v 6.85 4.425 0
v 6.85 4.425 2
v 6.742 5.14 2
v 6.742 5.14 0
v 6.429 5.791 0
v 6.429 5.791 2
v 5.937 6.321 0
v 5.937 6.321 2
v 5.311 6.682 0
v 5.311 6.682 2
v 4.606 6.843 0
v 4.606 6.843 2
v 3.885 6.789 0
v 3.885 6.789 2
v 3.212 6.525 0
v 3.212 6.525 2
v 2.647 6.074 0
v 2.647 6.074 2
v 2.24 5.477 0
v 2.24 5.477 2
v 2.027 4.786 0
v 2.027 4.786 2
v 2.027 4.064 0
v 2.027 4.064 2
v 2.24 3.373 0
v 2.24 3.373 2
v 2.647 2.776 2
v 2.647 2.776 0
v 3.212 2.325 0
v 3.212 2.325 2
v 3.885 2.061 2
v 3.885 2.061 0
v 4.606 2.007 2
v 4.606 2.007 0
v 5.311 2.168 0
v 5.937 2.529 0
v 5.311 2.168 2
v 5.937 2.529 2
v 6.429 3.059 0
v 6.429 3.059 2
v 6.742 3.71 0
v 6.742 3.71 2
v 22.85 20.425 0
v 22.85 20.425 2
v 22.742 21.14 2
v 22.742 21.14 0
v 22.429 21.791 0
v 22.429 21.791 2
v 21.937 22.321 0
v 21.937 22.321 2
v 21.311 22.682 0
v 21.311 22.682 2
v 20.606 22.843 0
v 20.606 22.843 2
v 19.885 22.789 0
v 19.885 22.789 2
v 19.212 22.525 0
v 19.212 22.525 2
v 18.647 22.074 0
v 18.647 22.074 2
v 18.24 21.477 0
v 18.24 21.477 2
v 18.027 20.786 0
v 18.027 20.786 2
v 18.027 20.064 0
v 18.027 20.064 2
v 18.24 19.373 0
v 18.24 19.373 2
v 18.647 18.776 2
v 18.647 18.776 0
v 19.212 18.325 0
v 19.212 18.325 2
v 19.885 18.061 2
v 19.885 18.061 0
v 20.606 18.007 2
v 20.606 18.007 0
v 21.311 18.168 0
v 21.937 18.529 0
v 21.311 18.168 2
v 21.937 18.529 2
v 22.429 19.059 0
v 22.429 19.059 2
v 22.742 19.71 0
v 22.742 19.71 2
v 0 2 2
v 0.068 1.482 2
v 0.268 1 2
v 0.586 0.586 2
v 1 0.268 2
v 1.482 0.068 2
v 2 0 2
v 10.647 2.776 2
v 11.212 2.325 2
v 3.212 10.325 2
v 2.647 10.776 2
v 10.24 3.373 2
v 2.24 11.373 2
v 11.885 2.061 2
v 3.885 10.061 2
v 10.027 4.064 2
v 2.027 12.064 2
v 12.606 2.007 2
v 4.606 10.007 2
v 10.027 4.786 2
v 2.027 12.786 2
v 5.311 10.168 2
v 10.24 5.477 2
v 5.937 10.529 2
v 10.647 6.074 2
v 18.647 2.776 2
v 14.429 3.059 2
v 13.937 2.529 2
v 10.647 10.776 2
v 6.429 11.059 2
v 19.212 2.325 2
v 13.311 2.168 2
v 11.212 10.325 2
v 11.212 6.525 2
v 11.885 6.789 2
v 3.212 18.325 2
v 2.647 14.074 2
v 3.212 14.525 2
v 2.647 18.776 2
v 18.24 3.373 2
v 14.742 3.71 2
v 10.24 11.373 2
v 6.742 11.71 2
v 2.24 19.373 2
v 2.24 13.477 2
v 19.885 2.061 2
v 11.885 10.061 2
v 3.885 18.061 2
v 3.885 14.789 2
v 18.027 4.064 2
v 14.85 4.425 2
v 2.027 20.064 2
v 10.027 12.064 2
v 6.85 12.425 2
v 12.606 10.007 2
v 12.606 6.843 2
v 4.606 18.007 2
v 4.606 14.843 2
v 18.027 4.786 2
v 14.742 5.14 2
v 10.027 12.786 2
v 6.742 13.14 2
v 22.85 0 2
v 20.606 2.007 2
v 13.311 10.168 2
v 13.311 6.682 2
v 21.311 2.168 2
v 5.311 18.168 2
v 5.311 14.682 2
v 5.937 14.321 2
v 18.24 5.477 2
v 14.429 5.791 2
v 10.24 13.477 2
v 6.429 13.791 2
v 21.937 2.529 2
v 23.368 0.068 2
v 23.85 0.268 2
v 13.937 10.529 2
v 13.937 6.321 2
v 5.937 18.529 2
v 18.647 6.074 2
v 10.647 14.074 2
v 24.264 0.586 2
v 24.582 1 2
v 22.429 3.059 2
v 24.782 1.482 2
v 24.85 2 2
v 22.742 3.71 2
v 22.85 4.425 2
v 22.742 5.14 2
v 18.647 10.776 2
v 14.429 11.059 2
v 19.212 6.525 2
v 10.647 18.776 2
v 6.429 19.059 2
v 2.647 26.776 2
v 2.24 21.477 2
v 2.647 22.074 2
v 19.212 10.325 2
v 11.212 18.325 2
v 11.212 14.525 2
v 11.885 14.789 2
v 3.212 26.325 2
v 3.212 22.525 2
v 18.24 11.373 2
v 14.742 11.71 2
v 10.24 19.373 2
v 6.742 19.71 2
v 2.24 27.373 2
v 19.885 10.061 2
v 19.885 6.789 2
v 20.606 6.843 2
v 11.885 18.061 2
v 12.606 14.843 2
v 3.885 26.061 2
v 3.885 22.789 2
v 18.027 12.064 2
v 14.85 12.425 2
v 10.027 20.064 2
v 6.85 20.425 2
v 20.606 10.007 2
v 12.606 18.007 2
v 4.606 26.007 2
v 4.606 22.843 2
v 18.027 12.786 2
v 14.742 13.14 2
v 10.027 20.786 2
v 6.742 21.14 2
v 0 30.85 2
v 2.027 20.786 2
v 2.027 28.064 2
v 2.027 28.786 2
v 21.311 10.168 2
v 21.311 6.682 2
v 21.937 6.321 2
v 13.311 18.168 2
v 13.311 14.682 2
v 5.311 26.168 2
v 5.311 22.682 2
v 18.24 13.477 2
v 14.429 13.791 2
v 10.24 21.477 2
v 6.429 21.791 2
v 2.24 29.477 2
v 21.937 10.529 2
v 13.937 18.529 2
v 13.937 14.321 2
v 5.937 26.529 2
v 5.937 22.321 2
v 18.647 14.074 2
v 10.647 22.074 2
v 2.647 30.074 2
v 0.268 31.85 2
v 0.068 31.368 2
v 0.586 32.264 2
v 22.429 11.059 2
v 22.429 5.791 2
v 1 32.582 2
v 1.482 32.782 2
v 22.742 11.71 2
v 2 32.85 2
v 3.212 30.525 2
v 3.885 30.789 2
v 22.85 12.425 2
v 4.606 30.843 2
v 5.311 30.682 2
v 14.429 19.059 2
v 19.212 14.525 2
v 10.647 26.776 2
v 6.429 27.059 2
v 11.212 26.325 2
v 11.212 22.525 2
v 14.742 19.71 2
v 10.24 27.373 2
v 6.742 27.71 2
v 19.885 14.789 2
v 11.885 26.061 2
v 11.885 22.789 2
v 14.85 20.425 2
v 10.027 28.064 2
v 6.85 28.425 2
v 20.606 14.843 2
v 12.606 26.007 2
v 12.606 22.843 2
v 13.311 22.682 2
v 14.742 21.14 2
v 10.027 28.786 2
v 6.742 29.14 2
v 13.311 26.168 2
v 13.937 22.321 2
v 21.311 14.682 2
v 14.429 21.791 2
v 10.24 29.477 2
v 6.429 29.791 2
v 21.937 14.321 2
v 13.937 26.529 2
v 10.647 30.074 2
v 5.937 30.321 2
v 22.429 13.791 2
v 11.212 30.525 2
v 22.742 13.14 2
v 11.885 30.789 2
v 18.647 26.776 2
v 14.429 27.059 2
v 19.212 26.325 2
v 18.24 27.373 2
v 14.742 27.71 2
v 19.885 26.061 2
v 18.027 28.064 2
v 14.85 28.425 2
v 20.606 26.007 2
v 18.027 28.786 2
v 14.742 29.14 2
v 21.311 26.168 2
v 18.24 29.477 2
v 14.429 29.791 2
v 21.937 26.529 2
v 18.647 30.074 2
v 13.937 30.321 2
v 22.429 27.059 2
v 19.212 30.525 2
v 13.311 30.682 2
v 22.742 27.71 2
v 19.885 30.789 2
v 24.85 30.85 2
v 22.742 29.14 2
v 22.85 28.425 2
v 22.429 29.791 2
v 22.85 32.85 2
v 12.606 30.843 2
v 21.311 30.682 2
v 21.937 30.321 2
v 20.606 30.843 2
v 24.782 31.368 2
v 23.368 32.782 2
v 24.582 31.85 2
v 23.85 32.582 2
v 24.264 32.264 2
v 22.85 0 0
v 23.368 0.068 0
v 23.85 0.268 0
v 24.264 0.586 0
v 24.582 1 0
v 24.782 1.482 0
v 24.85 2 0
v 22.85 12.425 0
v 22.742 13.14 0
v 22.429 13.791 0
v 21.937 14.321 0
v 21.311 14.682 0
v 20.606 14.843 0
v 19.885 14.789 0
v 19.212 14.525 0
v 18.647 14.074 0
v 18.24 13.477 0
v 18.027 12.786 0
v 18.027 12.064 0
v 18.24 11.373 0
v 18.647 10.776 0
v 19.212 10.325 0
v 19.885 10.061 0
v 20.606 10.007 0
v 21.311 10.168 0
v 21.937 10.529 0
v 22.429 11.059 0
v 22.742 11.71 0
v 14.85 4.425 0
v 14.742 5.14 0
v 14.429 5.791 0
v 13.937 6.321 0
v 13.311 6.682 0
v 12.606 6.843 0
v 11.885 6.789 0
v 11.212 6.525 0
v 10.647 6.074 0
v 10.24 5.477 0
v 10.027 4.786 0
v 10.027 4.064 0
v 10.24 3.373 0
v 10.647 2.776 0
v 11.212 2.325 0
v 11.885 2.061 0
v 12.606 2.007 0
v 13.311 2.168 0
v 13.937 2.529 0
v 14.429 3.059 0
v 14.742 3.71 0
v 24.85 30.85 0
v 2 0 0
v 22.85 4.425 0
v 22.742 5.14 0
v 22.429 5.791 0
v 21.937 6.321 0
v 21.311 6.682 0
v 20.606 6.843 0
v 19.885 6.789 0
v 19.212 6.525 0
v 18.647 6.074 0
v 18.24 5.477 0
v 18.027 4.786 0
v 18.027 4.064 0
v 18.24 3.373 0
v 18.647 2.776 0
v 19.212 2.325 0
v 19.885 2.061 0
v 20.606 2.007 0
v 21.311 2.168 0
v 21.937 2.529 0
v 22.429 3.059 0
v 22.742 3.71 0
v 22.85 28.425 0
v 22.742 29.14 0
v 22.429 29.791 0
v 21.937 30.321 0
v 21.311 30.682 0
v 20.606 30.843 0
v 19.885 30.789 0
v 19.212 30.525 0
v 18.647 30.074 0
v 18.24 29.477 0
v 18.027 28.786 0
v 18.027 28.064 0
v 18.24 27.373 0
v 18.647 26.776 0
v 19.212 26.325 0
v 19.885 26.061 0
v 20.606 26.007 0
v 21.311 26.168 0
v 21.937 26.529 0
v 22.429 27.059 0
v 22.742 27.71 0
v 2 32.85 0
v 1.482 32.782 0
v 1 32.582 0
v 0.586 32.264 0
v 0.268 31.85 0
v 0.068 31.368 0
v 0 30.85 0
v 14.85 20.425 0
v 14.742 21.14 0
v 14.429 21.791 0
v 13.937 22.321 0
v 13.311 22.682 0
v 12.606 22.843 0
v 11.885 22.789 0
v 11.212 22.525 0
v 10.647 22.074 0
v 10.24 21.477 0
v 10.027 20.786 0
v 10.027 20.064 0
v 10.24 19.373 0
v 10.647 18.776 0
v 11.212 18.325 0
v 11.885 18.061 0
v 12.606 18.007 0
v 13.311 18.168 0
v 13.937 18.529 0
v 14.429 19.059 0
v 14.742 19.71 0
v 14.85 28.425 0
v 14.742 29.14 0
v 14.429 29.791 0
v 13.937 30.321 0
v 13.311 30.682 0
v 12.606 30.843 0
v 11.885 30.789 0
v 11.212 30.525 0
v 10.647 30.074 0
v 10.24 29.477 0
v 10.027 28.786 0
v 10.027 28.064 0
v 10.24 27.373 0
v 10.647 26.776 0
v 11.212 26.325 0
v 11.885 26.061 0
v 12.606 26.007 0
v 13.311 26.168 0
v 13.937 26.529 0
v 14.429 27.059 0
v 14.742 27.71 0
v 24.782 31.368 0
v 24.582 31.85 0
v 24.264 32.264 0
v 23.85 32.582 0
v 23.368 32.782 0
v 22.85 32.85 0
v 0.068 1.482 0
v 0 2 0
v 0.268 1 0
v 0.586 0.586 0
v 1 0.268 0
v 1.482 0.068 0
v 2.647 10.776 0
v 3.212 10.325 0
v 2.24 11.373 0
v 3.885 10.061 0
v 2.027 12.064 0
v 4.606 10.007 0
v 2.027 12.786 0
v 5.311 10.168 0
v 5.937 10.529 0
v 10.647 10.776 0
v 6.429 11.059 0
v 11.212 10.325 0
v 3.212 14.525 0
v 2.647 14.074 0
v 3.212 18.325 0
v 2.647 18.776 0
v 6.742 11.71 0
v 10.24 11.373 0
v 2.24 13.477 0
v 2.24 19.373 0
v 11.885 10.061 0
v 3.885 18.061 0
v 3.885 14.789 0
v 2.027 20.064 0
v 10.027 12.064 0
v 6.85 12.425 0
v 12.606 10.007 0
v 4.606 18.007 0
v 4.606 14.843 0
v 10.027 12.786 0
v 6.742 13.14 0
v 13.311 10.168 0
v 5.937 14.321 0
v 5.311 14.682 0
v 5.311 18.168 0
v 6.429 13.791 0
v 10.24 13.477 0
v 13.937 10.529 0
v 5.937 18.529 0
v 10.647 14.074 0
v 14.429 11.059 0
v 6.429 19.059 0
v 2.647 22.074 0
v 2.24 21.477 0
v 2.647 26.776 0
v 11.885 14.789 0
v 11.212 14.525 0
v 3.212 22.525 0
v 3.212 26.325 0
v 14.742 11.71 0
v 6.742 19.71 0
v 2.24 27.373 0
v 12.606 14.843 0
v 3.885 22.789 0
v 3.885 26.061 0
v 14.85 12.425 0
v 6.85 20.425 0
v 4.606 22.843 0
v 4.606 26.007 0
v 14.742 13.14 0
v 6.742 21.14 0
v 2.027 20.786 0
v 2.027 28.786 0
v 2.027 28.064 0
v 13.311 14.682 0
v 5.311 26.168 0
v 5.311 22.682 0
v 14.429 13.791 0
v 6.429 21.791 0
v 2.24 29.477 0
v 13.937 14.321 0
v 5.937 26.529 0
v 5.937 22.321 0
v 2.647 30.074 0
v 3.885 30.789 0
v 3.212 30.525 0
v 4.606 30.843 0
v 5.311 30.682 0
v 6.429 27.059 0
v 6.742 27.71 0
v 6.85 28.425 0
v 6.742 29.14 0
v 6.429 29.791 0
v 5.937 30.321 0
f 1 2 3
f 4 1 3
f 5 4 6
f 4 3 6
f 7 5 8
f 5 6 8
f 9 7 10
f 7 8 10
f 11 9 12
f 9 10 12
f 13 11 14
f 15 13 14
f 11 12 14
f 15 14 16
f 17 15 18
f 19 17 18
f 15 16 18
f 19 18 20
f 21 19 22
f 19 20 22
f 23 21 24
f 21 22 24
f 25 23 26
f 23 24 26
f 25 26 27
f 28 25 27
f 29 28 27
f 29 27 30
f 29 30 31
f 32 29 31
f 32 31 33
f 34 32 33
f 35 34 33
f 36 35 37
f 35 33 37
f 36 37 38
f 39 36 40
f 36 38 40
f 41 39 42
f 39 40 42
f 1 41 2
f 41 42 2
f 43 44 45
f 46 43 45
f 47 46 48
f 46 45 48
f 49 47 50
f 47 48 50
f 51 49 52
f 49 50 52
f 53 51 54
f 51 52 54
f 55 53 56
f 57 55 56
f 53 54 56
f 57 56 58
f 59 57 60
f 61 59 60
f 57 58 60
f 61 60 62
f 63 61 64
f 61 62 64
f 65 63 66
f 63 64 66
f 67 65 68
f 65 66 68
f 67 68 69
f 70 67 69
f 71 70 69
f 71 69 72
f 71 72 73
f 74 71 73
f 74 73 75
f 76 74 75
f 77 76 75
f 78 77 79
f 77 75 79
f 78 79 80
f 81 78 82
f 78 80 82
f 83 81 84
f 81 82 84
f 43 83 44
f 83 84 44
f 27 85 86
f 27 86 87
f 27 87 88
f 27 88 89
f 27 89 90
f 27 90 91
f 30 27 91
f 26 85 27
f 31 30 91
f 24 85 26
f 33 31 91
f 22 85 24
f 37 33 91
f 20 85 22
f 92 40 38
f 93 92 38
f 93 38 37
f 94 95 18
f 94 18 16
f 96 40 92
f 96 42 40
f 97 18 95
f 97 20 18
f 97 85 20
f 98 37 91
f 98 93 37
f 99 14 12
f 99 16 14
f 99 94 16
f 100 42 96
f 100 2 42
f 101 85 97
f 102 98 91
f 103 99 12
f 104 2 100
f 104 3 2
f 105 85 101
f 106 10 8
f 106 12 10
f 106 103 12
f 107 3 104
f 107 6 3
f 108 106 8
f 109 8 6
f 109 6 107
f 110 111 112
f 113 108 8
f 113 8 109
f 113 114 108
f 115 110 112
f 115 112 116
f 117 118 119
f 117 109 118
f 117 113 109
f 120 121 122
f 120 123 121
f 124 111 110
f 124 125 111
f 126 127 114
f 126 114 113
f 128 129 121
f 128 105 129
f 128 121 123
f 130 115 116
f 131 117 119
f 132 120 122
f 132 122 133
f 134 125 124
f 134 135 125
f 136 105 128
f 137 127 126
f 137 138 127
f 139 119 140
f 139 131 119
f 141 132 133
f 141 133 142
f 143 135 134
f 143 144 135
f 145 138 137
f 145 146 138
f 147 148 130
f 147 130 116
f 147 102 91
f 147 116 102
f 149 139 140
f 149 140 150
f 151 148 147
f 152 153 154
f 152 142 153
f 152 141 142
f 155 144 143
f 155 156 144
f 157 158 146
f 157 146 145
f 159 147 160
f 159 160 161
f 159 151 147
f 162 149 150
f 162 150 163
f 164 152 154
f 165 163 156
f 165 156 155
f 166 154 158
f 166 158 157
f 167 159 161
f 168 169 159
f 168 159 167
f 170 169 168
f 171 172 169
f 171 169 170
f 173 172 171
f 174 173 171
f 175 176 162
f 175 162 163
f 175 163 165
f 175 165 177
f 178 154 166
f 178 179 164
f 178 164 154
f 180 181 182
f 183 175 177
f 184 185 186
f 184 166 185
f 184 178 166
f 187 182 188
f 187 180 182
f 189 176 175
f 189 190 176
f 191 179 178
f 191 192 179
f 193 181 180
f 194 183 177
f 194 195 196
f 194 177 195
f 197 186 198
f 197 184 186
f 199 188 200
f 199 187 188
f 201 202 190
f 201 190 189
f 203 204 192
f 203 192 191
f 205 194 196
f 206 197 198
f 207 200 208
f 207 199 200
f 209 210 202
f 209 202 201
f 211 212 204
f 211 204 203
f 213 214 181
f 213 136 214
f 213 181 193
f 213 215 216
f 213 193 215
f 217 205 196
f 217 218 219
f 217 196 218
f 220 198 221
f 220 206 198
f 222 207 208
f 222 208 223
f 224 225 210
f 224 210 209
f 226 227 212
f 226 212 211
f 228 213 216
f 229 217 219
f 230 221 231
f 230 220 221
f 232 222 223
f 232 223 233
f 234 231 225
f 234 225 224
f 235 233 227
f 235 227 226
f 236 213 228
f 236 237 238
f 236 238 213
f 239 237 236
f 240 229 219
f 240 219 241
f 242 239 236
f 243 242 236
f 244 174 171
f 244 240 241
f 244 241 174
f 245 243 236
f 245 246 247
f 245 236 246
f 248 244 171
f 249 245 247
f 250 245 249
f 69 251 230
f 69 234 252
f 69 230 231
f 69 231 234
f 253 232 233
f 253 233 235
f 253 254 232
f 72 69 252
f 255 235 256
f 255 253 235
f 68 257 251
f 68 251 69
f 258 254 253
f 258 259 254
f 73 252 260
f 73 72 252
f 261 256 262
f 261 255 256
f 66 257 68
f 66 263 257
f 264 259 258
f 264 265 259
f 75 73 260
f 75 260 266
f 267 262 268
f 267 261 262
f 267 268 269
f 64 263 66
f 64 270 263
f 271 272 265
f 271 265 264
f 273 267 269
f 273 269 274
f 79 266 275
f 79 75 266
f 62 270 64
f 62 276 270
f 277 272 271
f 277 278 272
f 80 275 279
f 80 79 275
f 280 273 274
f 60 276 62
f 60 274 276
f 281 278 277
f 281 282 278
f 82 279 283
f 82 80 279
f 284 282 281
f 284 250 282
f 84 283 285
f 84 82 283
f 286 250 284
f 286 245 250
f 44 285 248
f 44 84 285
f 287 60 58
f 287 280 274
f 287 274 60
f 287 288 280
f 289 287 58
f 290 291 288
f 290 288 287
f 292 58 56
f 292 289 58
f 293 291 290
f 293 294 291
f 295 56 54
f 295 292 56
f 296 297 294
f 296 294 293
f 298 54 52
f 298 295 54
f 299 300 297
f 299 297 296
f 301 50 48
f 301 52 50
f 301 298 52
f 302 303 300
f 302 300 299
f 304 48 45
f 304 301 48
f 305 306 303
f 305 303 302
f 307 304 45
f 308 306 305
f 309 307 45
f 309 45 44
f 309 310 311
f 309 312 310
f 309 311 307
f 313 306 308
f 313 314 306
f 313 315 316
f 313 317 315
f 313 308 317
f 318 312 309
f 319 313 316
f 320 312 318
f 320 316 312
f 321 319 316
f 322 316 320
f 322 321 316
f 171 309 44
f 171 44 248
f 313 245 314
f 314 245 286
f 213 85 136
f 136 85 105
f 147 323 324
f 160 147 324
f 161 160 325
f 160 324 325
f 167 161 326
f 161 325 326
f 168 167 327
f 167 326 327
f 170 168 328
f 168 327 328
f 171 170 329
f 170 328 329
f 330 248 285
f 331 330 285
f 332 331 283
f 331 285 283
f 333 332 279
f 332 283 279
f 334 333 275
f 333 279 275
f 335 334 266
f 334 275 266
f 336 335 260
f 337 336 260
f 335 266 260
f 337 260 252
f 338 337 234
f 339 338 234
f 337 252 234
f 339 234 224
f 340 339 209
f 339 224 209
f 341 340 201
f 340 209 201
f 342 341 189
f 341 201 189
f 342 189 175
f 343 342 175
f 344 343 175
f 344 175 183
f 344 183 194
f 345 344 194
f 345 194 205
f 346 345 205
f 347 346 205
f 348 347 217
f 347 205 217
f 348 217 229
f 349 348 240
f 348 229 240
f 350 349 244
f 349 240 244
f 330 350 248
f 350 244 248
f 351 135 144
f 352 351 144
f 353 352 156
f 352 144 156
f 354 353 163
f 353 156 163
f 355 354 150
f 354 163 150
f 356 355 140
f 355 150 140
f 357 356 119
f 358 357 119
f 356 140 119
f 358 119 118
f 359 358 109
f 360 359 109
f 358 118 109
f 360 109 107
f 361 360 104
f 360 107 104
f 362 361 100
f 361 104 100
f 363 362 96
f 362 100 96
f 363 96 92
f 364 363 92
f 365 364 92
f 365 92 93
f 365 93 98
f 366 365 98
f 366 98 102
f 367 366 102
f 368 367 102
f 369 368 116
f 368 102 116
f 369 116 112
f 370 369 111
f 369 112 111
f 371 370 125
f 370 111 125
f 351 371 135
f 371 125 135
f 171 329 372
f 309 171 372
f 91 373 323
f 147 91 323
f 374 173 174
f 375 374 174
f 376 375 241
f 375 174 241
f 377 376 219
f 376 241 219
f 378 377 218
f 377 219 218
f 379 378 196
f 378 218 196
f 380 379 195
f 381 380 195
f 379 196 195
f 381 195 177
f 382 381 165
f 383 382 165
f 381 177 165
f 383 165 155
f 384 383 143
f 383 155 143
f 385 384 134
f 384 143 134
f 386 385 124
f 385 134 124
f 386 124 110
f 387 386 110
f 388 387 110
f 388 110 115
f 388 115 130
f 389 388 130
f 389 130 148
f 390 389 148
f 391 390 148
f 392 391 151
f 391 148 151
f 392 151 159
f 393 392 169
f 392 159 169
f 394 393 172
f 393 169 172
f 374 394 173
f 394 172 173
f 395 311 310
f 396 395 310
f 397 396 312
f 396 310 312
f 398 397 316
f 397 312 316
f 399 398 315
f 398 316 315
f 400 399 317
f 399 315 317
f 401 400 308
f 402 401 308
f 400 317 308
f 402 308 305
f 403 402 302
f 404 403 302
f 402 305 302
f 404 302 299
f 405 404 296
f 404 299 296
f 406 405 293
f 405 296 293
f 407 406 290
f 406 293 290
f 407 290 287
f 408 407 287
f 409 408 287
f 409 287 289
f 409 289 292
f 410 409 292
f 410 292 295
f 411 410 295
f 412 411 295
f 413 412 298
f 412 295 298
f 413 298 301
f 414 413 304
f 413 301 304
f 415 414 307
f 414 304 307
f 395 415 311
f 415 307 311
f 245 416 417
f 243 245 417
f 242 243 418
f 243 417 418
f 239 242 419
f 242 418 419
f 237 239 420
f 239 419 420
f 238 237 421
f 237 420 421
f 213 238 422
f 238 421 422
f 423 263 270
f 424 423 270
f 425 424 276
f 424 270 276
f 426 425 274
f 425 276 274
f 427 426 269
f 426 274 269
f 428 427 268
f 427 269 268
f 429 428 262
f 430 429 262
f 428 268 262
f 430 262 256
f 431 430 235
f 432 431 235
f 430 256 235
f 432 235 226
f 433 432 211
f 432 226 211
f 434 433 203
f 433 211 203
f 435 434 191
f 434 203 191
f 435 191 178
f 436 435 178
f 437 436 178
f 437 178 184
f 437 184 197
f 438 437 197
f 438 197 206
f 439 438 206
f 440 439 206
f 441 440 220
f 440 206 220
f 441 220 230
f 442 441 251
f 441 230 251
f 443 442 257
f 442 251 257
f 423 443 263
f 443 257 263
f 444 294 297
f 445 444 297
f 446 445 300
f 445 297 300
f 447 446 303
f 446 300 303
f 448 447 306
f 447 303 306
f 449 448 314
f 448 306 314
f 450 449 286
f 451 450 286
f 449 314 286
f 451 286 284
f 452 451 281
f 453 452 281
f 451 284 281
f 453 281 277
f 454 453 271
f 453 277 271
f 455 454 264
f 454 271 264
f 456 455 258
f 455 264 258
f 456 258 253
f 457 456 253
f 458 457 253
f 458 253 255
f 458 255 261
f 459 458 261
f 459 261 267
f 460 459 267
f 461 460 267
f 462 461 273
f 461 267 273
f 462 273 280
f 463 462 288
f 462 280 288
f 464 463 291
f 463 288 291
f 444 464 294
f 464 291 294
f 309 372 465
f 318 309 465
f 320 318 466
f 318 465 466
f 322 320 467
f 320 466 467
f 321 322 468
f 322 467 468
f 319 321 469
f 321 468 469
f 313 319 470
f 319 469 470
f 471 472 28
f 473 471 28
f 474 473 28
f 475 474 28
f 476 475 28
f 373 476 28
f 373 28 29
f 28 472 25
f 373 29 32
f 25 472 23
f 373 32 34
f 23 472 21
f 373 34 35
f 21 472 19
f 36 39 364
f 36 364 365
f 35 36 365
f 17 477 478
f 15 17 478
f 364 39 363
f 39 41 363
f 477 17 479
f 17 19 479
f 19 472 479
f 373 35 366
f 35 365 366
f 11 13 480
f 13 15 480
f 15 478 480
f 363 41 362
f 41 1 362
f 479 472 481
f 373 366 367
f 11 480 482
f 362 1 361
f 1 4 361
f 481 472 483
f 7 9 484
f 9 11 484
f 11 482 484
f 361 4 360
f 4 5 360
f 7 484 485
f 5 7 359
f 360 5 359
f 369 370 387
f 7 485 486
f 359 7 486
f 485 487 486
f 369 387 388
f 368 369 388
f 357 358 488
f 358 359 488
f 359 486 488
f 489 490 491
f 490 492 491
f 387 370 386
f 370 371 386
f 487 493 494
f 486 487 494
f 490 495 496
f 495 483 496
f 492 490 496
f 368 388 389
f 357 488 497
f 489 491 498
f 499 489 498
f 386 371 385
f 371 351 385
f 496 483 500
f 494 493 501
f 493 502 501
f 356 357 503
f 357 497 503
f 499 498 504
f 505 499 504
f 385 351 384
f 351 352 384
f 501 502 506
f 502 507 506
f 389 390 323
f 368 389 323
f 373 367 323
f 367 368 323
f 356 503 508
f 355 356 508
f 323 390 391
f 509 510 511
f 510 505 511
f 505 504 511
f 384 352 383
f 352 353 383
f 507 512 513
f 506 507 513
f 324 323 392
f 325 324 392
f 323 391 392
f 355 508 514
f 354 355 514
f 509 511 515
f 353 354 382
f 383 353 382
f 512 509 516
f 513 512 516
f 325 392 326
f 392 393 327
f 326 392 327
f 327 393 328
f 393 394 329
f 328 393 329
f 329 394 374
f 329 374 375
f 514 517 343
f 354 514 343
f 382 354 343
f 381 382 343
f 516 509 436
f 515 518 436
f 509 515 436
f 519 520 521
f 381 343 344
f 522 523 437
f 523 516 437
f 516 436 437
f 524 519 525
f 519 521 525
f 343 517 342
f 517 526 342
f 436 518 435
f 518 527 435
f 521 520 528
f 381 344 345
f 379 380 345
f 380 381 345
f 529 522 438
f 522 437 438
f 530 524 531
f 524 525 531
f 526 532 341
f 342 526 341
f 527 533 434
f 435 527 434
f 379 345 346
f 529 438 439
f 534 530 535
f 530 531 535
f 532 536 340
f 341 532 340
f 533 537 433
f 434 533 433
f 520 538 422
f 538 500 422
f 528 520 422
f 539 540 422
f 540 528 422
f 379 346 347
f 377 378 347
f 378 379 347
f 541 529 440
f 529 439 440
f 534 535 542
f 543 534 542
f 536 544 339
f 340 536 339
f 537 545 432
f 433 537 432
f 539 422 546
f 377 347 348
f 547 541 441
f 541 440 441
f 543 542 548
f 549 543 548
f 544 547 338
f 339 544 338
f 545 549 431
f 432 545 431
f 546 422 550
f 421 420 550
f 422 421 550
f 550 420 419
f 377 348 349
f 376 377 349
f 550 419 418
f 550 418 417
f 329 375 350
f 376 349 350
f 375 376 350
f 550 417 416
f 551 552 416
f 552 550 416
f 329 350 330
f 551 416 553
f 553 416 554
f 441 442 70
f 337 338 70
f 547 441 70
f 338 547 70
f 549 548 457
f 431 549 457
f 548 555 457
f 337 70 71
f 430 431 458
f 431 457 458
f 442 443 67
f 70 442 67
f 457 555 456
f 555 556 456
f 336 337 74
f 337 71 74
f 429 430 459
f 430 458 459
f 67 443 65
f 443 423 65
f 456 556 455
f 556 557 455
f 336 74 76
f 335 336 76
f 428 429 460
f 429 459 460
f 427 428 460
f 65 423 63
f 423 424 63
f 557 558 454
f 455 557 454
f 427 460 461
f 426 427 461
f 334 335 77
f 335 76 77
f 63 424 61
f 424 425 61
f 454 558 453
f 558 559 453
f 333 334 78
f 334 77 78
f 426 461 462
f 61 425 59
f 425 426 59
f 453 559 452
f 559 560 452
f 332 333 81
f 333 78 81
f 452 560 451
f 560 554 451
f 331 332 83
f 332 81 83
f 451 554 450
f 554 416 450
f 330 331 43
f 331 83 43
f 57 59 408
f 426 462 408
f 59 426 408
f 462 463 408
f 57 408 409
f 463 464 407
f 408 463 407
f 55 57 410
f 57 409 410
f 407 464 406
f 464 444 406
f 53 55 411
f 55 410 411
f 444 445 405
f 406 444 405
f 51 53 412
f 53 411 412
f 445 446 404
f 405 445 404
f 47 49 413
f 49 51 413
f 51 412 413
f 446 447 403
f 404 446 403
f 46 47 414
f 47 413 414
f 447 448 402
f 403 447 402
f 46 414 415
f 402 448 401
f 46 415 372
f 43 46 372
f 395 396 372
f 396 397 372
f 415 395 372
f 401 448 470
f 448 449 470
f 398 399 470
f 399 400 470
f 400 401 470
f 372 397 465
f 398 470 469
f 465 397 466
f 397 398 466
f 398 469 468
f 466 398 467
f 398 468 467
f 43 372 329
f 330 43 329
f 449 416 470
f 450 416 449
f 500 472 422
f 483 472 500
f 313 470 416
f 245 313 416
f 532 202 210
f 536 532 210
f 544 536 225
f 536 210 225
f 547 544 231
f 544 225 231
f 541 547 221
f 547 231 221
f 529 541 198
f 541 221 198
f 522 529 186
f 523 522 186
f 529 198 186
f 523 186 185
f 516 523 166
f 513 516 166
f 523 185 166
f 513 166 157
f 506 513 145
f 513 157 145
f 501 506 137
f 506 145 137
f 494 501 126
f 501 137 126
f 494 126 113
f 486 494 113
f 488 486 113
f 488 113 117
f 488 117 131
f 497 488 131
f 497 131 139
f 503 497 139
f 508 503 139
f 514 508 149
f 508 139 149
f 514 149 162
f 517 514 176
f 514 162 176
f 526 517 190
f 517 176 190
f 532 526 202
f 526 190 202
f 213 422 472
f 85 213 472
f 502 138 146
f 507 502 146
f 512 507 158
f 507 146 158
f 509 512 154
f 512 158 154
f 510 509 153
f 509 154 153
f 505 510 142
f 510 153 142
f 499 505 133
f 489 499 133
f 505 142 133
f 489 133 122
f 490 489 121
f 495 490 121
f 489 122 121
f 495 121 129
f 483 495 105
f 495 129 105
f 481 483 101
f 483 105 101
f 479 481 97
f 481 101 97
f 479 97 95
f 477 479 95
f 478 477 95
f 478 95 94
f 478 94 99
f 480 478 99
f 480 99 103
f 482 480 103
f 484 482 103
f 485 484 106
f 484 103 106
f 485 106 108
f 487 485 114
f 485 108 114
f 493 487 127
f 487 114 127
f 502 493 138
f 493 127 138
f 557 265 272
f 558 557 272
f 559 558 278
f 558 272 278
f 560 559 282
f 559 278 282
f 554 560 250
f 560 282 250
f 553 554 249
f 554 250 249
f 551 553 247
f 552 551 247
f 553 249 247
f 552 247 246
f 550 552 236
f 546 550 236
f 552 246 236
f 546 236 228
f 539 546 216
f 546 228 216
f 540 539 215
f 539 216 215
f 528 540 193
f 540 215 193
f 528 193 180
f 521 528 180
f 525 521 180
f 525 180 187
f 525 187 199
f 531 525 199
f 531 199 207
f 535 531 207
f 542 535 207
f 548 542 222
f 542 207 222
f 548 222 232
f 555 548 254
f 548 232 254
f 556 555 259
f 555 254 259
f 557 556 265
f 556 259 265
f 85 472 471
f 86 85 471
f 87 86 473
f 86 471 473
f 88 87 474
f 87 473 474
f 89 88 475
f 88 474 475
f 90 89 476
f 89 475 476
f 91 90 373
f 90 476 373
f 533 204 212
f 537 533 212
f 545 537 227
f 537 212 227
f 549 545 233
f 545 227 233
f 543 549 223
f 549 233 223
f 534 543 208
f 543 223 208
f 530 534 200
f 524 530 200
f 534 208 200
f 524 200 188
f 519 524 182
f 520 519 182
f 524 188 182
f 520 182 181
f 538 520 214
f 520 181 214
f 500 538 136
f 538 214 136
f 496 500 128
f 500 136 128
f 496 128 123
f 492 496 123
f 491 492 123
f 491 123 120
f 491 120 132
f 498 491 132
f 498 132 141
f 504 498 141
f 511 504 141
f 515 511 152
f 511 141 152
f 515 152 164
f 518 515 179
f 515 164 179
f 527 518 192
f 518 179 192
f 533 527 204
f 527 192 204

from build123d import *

# Parameters (mm, degrees)
BOSS_EXTRUDE2_DEPTH = 2
SKETCH2_R           = 2.425
CUT_EXTRUDE1_DEPTH  = 2


with BuildPart() as part:
    # Sketch1 → Boss-Extrude2 (new body)
    with BuildSketch(Plane.XY):
        with BuildLine():
            Line((2, 0), (22.85, 0))
            ThreePointArc((22.85, 0), (24.264213562, 0.585786438), (24.85, 2))
            Line((24.85, 2), (24.85, 30.85))
            ThreePointArc((24.85, 30.85), (24.264213562, 32.264213562), (22.85, 32.85))
            Line((22.85, 32.85), (2, 32.85))
            ThreePointArc((2, 32.85), (0.585786438, 32.264213562), (0, 30.85))
            Line((0, 30.85), (0, 2))
            ThreePointArc((0, 2), (0.585786438, 0.585786438), (2, 0))
        make_face()
    extrude(amount=BOSS_EXTRUDE2_DEPTH)

    # Sketch2 → Cut-Extrude1 (cut)
    with BuildSketch(Plane.XY.offset(2)):
        with Locations((4.425, 4.425)):
            Circle(SKETCH2_R)
        with Locations((12.425, 4.425)):
            Circle(SKETCH2_R)
        with Locations((20.425, 4.425)):
            Circle(SKETCH2_R)
        with Locations((4.425, 12.425)):
            Circle(SKETCH2_R)
        with Locations((12.425, 12.425)):
            Circle(SKETCH2_R)
        with Locations((20.425, 12.425)):
            Circle(SKETCH2_R)
        with Locations((4.425, 20.425)):
            Circle(SKETCH2_R)
        with Locations((12.425, 20.425)):
            Circle(SKETCH2_R)
        with Locations((20.425, 20.425)):
            Circle(SKETCH2_R)
        with Locations((4.425, 28.425)):
            Circle(SKETCH2_R)
        with Locations((12.425, 28.425)):
            Circle(SKETCH2_R)
        with Locations((20.425, 28.425)):
            Circle(SKETCH2_R)
    extrude(amount=-CUT_EXTRUDE1_DEPTH, mode=Mode.SUBTRACT)


solid = part.part
